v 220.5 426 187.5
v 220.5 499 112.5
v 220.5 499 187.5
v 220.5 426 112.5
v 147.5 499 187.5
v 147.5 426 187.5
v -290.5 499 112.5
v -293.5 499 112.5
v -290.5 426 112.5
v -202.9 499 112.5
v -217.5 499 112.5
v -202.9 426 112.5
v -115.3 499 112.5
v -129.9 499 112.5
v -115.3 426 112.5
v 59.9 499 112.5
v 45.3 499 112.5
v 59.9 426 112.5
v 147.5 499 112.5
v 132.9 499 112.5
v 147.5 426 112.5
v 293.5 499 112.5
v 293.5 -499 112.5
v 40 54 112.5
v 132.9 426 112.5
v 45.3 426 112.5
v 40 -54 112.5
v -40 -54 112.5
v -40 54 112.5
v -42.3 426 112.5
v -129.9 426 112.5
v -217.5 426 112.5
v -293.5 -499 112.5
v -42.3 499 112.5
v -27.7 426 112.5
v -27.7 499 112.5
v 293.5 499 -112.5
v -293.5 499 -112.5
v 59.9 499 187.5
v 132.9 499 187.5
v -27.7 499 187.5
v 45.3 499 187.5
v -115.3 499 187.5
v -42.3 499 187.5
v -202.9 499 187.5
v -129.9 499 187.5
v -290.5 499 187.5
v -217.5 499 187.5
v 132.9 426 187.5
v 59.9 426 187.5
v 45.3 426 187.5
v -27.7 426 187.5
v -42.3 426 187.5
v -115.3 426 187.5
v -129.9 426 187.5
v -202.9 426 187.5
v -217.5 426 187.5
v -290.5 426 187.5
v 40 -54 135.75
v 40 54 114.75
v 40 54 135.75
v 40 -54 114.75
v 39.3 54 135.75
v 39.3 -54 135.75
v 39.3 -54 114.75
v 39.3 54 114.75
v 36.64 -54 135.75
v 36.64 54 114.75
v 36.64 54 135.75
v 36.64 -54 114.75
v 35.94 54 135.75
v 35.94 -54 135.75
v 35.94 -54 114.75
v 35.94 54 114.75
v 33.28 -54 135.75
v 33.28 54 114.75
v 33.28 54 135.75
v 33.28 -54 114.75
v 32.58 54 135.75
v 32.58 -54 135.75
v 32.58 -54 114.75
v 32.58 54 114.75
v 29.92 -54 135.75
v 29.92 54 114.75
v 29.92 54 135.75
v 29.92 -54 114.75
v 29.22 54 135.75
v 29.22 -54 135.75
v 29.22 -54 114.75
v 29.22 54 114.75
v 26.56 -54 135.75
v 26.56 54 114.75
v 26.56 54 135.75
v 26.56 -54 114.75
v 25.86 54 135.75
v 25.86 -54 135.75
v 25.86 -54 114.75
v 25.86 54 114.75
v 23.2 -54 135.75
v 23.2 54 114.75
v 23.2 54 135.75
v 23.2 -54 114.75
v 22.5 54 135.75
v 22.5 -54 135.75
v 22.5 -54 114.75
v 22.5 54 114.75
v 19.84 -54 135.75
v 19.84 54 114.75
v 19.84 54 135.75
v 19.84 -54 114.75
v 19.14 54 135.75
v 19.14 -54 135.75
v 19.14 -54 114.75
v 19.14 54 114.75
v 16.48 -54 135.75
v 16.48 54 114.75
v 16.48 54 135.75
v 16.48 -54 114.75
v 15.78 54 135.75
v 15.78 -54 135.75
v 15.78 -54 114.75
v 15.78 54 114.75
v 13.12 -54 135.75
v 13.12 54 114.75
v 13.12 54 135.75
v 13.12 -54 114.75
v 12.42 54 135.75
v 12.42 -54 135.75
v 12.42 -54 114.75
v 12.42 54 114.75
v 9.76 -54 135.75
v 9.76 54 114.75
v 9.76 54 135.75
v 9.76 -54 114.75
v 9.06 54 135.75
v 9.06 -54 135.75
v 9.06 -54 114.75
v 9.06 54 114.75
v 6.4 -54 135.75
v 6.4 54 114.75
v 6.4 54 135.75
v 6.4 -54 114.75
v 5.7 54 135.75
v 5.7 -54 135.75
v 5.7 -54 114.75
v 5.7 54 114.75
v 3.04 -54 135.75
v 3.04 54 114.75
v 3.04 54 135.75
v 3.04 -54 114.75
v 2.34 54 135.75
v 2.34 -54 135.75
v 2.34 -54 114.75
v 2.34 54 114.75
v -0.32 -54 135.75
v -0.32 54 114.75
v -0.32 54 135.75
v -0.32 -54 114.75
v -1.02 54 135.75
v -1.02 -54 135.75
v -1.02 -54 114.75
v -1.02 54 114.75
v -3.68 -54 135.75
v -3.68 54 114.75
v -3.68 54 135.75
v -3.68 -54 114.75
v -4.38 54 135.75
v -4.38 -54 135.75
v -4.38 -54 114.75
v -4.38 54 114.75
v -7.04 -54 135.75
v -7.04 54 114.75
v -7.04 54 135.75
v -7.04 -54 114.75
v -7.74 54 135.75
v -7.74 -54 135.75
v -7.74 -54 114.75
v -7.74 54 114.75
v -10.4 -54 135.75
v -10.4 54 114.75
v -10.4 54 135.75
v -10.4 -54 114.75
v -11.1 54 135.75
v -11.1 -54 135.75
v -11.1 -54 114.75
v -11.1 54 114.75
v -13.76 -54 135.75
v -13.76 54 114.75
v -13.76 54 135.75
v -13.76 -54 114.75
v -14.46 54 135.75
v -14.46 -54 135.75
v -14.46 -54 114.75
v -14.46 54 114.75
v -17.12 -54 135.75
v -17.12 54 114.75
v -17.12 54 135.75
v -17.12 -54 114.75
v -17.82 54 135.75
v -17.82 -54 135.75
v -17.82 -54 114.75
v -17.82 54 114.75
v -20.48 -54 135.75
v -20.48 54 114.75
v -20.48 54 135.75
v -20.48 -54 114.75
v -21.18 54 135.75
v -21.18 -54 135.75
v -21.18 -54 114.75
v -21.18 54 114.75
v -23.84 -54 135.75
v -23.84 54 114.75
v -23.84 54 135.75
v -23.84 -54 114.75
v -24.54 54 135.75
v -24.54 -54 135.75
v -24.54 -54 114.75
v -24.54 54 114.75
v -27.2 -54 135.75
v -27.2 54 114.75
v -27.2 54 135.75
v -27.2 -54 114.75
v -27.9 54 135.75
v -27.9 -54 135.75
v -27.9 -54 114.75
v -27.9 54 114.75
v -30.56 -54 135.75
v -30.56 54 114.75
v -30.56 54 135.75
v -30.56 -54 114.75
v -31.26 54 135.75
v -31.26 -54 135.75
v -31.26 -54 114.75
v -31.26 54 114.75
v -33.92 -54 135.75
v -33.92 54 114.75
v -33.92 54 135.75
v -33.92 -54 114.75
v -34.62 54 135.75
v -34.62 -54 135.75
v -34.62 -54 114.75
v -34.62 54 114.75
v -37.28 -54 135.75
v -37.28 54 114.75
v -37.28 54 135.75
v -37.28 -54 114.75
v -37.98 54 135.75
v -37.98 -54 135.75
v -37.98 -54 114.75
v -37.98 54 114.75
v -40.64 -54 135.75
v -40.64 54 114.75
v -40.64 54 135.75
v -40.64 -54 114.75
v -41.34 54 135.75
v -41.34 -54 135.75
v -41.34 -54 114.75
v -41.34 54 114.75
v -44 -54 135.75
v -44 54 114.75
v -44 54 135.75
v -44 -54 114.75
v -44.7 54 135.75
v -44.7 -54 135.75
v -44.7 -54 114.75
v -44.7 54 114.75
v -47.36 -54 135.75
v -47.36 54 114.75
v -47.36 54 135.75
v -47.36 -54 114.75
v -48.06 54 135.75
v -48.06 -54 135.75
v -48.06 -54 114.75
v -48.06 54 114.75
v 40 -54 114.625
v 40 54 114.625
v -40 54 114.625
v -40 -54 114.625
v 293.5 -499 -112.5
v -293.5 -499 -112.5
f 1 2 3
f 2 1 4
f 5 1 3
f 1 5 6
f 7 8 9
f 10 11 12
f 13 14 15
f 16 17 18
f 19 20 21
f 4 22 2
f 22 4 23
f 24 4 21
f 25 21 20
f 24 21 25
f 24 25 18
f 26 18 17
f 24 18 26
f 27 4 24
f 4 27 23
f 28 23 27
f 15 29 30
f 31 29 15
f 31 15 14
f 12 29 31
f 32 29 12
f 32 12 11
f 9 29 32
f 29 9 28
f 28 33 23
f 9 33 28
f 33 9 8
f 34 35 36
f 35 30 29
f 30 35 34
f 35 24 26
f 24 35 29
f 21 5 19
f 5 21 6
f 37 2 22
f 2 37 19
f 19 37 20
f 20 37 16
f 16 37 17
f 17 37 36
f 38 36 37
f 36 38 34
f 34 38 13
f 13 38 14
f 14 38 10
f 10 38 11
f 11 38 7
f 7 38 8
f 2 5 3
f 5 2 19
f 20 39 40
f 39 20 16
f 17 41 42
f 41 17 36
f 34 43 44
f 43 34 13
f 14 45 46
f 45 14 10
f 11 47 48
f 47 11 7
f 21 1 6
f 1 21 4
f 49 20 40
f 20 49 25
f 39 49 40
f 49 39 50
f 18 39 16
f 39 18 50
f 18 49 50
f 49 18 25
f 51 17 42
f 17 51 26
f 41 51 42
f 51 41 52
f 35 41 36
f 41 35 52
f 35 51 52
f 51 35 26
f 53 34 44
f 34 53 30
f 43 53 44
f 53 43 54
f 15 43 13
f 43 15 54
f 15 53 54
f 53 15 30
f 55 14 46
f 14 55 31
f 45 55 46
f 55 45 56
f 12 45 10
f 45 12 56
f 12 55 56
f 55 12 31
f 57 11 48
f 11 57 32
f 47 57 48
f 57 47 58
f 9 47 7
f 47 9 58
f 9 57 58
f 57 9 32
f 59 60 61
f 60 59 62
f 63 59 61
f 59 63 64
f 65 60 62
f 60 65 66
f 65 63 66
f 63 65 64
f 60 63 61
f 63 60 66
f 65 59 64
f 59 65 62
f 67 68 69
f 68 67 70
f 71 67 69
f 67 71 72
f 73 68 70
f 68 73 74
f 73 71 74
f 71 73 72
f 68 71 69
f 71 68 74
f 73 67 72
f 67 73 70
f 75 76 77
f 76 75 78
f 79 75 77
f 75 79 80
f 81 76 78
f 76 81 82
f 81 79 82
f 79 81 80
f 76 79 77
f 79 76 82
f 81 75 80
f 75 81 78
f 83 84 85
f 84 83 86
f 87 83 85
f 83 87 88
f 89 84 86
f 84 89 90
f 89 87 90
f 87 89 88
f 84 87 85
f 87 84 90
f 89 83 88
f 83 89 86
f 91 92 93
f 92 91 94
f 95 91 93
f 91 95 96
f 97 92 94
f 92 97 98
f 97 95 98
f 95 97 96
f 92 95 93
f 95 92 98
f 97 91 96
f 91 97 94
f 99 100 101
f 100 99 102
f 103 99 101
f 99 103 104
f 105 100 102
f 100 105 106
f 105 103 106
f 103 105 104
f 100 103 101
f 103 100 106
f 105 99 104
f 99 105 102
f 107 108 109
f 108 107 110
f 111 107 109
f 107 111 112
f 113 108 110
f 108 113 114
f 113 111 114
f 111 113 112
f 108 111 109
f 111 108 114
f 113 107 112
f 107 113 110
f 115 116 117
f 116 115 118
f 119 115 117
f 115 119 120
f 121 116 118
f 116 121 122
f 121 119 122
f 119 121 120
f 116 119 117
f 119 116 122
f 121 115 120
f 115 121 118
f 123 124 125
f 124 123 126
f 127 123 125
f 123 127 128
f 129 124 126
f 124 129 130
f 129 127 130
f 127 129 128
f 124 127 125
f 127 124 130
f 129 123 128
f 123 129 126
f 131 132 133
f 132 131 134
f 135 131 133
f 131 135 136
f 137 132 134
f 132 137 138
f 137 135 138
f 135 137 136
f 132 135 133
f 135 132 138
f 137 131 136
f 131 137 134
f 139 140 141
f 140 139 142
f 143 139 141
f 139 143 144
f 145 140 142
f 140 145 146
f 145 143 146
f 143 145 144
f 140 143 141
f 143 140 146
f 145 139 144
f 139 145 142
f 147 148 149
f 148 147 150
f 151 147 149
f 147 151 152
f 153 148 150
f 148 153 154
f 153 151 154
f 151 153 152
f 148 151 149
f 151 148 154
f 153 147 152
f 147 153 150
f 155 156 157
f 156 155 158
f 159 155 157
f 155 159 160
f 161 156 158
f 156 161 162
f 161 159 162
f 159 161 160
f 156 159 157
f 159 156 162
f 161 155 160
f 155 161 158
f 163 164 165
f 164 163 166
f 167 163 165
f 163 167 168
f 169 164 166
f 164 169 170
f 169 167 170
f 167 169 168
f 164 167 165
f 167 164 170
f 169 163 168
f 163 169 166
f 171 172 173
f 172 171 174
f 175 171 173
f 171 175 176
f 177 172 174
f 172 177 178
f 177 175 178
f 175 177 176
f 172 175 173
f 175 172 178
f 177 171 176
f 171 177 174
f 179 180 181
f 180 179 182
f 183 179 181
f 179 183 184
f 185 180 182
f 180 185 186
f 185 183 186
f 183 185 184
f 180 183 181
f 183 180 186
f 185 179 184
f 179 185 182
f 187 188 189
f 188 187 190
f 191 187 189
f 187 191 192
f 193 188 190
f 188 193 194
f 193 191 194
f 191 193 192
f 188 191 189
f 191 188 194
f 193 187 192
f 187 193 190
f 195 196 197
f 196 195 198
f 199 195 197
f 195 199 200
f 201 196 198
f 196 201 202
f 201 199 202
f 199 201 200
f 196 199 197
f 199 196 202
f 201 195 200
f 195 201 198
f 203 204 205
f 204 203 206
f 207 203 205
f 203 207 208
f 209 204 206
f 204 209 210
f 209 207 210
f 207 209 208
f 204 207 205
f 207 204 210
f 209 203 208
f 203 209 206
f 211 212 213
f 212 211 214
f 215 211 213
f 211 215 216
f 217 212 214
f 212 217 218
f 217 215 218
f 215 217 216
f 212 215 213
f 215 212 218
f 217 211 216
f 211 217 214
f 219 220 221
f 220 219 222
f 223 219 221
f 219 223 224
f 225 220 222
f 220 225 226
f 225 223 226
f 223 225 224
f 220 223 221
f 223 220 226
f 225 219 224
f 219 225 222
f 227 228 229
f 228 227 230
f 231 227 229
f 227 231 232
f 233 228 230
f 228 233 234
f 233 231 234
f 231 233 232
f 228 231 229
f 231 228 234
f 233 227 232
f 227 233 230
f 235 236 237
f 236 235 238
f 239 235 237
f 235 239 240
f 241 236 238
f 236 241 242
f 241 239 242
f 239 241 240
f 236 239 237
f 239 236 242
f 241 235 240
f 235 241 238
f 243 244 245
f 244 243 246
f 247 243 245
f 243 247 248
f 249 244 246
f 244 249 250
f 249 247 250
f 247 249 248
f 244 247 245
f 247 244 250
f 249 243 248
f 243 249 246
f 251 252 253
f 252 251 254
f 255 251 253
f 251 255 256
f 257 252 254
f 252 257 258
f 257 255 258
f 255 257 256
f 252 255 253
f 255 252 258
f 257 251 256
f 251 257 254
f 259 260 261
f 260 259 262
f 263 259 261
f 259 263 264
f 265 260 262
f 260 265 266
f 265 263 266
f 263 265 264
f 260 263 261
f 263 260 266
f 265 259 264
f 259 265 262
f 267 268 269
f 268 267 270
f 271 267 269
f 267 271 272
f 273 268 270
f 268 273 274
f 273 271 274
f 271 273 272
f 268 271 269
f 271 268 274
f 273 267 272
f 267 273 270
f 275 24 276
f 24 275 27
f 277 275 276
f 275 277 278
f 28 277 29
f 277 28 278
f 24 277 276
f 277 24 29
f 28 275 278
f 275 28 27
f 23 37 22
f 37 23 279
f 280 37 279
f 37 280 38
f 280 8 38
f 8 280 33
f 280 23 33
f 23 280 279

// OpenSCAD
module chasis(x, y, z) {
    // dimensions in mm (x, y, z) is (Width, Depth, Height)
    color("white") cube([x, y, z], true);
}


module base (width, depth, height) {
    // we want the heat sink to start at the top of the chasis
    color("Green") cube([width, depth, height], true);
}

module plate_fin (width, height, depth) {
    color("Lime") cube([width, height, depth], true);
}
    
// Single heat sink
// pos: position
module heatsink (pos, base_w, base_d, base_h, fin_w, fin_h, fin_d, fin_spacing) {
    
    translate (pos) {
        base(base_w, base_d, base_h);
    
        fin_x = (base_w/2) - (fin_w/2);
        fin_y = 0;
        fin_z = base_h*3;
        base_start = (base_w / 2) - (fin_w/2);
        // Total fins we can place inside the base
        total_fins = base_w / ((fin_w/2) + fin_spacing);
        
        echo(base_w);
        
        //translate([base_start, fin_y, fin_z]) plate_fin(fin_w, fin_d, fin_h);  
        //translate([base_start + -fin_spacing, fin_y, fin_z]) plate_fin(fin_w, fin_d, fin_h);
       //translate([base_start + -fin_spacing*2, fin_y, fin_z]) plate_fin(fin_w, fin_d, fin_h); 
        //translate([base_start, fin_y, fin_z]) plate_fin(fin_w, fin_d, fin_h);  
        
        // Start at the base and fill from there
        for (i = [0: total_fins]) {
            translate([base_start - ((fin_spacing * i) + (fin_w * i)), fin_y, fin_z]) plate_fin(fin_w, fin_d, fin_h);
            echo(i);
        }
      
        
       
        //translate([fin_x - (fin_x / 2 - fin_spacing), fin_y, fin_z]) plate_fin(fin_w, fin_d, fin_h);
        //translate([fin_x - ((fin_x / 2) * 2 - (fin_spacing)), fin_y, fin_z]) plate_fin(fin_w, fin_d, fin_h);
        //translate([fin_x - ((fin_x / 2) * 3 - (fin_spacing)), fin_y, fin_z]) plate_fin(fin_w, fin_d, fin_h);
        //translate([fin_x - ((fin_x / 2) * 4 - (fin_spacing)), fin_y, fin_z]) plate_fin(fin_w, fin_d, fin_h);
    }
}


// Heat sinks in the chasis
module heatsinks () {
    position = [0, 0, height_server / 2];
    fin_height = 10;
    
    // base (mm)
    base_w = 80; // 寬度
    base_h = 4.25;  // 
    base_d = 108; // 長度
    
    // Fin (mm)
    fin_w = 0.7; // 
    fin_h = 21; // 
    fin_d = base_d; // 
    fin_spacing = 2.66;
    
    // Bypass (mm)
    bp_w = 200;
    bp_h = 44.5;
    
    heatsink(position, base_w, base_d, base_h, fin_w, fin_h, fin_d, fin_spacing);
}

module fans () {
    height = height_server - 150;
    width = 73;
    depth = 73;
        
    x = (width_server / 2) - (width / 2);
    y = (depth_server / 2) - (depth / 2);
    z = (height_server/ 2) + (height / 2);
    
    
    for (i = [1: 1.2: 7]) {
    
        translate([x - (width * i), y, z]) cube([width, depth, height], true);
            
    }
}


width_server = 587; // mm
height_server = 225; // mm
depth_server = 998; // mm

chasis(width_server, depth_server, height_server);
fans();
heatsinks();
